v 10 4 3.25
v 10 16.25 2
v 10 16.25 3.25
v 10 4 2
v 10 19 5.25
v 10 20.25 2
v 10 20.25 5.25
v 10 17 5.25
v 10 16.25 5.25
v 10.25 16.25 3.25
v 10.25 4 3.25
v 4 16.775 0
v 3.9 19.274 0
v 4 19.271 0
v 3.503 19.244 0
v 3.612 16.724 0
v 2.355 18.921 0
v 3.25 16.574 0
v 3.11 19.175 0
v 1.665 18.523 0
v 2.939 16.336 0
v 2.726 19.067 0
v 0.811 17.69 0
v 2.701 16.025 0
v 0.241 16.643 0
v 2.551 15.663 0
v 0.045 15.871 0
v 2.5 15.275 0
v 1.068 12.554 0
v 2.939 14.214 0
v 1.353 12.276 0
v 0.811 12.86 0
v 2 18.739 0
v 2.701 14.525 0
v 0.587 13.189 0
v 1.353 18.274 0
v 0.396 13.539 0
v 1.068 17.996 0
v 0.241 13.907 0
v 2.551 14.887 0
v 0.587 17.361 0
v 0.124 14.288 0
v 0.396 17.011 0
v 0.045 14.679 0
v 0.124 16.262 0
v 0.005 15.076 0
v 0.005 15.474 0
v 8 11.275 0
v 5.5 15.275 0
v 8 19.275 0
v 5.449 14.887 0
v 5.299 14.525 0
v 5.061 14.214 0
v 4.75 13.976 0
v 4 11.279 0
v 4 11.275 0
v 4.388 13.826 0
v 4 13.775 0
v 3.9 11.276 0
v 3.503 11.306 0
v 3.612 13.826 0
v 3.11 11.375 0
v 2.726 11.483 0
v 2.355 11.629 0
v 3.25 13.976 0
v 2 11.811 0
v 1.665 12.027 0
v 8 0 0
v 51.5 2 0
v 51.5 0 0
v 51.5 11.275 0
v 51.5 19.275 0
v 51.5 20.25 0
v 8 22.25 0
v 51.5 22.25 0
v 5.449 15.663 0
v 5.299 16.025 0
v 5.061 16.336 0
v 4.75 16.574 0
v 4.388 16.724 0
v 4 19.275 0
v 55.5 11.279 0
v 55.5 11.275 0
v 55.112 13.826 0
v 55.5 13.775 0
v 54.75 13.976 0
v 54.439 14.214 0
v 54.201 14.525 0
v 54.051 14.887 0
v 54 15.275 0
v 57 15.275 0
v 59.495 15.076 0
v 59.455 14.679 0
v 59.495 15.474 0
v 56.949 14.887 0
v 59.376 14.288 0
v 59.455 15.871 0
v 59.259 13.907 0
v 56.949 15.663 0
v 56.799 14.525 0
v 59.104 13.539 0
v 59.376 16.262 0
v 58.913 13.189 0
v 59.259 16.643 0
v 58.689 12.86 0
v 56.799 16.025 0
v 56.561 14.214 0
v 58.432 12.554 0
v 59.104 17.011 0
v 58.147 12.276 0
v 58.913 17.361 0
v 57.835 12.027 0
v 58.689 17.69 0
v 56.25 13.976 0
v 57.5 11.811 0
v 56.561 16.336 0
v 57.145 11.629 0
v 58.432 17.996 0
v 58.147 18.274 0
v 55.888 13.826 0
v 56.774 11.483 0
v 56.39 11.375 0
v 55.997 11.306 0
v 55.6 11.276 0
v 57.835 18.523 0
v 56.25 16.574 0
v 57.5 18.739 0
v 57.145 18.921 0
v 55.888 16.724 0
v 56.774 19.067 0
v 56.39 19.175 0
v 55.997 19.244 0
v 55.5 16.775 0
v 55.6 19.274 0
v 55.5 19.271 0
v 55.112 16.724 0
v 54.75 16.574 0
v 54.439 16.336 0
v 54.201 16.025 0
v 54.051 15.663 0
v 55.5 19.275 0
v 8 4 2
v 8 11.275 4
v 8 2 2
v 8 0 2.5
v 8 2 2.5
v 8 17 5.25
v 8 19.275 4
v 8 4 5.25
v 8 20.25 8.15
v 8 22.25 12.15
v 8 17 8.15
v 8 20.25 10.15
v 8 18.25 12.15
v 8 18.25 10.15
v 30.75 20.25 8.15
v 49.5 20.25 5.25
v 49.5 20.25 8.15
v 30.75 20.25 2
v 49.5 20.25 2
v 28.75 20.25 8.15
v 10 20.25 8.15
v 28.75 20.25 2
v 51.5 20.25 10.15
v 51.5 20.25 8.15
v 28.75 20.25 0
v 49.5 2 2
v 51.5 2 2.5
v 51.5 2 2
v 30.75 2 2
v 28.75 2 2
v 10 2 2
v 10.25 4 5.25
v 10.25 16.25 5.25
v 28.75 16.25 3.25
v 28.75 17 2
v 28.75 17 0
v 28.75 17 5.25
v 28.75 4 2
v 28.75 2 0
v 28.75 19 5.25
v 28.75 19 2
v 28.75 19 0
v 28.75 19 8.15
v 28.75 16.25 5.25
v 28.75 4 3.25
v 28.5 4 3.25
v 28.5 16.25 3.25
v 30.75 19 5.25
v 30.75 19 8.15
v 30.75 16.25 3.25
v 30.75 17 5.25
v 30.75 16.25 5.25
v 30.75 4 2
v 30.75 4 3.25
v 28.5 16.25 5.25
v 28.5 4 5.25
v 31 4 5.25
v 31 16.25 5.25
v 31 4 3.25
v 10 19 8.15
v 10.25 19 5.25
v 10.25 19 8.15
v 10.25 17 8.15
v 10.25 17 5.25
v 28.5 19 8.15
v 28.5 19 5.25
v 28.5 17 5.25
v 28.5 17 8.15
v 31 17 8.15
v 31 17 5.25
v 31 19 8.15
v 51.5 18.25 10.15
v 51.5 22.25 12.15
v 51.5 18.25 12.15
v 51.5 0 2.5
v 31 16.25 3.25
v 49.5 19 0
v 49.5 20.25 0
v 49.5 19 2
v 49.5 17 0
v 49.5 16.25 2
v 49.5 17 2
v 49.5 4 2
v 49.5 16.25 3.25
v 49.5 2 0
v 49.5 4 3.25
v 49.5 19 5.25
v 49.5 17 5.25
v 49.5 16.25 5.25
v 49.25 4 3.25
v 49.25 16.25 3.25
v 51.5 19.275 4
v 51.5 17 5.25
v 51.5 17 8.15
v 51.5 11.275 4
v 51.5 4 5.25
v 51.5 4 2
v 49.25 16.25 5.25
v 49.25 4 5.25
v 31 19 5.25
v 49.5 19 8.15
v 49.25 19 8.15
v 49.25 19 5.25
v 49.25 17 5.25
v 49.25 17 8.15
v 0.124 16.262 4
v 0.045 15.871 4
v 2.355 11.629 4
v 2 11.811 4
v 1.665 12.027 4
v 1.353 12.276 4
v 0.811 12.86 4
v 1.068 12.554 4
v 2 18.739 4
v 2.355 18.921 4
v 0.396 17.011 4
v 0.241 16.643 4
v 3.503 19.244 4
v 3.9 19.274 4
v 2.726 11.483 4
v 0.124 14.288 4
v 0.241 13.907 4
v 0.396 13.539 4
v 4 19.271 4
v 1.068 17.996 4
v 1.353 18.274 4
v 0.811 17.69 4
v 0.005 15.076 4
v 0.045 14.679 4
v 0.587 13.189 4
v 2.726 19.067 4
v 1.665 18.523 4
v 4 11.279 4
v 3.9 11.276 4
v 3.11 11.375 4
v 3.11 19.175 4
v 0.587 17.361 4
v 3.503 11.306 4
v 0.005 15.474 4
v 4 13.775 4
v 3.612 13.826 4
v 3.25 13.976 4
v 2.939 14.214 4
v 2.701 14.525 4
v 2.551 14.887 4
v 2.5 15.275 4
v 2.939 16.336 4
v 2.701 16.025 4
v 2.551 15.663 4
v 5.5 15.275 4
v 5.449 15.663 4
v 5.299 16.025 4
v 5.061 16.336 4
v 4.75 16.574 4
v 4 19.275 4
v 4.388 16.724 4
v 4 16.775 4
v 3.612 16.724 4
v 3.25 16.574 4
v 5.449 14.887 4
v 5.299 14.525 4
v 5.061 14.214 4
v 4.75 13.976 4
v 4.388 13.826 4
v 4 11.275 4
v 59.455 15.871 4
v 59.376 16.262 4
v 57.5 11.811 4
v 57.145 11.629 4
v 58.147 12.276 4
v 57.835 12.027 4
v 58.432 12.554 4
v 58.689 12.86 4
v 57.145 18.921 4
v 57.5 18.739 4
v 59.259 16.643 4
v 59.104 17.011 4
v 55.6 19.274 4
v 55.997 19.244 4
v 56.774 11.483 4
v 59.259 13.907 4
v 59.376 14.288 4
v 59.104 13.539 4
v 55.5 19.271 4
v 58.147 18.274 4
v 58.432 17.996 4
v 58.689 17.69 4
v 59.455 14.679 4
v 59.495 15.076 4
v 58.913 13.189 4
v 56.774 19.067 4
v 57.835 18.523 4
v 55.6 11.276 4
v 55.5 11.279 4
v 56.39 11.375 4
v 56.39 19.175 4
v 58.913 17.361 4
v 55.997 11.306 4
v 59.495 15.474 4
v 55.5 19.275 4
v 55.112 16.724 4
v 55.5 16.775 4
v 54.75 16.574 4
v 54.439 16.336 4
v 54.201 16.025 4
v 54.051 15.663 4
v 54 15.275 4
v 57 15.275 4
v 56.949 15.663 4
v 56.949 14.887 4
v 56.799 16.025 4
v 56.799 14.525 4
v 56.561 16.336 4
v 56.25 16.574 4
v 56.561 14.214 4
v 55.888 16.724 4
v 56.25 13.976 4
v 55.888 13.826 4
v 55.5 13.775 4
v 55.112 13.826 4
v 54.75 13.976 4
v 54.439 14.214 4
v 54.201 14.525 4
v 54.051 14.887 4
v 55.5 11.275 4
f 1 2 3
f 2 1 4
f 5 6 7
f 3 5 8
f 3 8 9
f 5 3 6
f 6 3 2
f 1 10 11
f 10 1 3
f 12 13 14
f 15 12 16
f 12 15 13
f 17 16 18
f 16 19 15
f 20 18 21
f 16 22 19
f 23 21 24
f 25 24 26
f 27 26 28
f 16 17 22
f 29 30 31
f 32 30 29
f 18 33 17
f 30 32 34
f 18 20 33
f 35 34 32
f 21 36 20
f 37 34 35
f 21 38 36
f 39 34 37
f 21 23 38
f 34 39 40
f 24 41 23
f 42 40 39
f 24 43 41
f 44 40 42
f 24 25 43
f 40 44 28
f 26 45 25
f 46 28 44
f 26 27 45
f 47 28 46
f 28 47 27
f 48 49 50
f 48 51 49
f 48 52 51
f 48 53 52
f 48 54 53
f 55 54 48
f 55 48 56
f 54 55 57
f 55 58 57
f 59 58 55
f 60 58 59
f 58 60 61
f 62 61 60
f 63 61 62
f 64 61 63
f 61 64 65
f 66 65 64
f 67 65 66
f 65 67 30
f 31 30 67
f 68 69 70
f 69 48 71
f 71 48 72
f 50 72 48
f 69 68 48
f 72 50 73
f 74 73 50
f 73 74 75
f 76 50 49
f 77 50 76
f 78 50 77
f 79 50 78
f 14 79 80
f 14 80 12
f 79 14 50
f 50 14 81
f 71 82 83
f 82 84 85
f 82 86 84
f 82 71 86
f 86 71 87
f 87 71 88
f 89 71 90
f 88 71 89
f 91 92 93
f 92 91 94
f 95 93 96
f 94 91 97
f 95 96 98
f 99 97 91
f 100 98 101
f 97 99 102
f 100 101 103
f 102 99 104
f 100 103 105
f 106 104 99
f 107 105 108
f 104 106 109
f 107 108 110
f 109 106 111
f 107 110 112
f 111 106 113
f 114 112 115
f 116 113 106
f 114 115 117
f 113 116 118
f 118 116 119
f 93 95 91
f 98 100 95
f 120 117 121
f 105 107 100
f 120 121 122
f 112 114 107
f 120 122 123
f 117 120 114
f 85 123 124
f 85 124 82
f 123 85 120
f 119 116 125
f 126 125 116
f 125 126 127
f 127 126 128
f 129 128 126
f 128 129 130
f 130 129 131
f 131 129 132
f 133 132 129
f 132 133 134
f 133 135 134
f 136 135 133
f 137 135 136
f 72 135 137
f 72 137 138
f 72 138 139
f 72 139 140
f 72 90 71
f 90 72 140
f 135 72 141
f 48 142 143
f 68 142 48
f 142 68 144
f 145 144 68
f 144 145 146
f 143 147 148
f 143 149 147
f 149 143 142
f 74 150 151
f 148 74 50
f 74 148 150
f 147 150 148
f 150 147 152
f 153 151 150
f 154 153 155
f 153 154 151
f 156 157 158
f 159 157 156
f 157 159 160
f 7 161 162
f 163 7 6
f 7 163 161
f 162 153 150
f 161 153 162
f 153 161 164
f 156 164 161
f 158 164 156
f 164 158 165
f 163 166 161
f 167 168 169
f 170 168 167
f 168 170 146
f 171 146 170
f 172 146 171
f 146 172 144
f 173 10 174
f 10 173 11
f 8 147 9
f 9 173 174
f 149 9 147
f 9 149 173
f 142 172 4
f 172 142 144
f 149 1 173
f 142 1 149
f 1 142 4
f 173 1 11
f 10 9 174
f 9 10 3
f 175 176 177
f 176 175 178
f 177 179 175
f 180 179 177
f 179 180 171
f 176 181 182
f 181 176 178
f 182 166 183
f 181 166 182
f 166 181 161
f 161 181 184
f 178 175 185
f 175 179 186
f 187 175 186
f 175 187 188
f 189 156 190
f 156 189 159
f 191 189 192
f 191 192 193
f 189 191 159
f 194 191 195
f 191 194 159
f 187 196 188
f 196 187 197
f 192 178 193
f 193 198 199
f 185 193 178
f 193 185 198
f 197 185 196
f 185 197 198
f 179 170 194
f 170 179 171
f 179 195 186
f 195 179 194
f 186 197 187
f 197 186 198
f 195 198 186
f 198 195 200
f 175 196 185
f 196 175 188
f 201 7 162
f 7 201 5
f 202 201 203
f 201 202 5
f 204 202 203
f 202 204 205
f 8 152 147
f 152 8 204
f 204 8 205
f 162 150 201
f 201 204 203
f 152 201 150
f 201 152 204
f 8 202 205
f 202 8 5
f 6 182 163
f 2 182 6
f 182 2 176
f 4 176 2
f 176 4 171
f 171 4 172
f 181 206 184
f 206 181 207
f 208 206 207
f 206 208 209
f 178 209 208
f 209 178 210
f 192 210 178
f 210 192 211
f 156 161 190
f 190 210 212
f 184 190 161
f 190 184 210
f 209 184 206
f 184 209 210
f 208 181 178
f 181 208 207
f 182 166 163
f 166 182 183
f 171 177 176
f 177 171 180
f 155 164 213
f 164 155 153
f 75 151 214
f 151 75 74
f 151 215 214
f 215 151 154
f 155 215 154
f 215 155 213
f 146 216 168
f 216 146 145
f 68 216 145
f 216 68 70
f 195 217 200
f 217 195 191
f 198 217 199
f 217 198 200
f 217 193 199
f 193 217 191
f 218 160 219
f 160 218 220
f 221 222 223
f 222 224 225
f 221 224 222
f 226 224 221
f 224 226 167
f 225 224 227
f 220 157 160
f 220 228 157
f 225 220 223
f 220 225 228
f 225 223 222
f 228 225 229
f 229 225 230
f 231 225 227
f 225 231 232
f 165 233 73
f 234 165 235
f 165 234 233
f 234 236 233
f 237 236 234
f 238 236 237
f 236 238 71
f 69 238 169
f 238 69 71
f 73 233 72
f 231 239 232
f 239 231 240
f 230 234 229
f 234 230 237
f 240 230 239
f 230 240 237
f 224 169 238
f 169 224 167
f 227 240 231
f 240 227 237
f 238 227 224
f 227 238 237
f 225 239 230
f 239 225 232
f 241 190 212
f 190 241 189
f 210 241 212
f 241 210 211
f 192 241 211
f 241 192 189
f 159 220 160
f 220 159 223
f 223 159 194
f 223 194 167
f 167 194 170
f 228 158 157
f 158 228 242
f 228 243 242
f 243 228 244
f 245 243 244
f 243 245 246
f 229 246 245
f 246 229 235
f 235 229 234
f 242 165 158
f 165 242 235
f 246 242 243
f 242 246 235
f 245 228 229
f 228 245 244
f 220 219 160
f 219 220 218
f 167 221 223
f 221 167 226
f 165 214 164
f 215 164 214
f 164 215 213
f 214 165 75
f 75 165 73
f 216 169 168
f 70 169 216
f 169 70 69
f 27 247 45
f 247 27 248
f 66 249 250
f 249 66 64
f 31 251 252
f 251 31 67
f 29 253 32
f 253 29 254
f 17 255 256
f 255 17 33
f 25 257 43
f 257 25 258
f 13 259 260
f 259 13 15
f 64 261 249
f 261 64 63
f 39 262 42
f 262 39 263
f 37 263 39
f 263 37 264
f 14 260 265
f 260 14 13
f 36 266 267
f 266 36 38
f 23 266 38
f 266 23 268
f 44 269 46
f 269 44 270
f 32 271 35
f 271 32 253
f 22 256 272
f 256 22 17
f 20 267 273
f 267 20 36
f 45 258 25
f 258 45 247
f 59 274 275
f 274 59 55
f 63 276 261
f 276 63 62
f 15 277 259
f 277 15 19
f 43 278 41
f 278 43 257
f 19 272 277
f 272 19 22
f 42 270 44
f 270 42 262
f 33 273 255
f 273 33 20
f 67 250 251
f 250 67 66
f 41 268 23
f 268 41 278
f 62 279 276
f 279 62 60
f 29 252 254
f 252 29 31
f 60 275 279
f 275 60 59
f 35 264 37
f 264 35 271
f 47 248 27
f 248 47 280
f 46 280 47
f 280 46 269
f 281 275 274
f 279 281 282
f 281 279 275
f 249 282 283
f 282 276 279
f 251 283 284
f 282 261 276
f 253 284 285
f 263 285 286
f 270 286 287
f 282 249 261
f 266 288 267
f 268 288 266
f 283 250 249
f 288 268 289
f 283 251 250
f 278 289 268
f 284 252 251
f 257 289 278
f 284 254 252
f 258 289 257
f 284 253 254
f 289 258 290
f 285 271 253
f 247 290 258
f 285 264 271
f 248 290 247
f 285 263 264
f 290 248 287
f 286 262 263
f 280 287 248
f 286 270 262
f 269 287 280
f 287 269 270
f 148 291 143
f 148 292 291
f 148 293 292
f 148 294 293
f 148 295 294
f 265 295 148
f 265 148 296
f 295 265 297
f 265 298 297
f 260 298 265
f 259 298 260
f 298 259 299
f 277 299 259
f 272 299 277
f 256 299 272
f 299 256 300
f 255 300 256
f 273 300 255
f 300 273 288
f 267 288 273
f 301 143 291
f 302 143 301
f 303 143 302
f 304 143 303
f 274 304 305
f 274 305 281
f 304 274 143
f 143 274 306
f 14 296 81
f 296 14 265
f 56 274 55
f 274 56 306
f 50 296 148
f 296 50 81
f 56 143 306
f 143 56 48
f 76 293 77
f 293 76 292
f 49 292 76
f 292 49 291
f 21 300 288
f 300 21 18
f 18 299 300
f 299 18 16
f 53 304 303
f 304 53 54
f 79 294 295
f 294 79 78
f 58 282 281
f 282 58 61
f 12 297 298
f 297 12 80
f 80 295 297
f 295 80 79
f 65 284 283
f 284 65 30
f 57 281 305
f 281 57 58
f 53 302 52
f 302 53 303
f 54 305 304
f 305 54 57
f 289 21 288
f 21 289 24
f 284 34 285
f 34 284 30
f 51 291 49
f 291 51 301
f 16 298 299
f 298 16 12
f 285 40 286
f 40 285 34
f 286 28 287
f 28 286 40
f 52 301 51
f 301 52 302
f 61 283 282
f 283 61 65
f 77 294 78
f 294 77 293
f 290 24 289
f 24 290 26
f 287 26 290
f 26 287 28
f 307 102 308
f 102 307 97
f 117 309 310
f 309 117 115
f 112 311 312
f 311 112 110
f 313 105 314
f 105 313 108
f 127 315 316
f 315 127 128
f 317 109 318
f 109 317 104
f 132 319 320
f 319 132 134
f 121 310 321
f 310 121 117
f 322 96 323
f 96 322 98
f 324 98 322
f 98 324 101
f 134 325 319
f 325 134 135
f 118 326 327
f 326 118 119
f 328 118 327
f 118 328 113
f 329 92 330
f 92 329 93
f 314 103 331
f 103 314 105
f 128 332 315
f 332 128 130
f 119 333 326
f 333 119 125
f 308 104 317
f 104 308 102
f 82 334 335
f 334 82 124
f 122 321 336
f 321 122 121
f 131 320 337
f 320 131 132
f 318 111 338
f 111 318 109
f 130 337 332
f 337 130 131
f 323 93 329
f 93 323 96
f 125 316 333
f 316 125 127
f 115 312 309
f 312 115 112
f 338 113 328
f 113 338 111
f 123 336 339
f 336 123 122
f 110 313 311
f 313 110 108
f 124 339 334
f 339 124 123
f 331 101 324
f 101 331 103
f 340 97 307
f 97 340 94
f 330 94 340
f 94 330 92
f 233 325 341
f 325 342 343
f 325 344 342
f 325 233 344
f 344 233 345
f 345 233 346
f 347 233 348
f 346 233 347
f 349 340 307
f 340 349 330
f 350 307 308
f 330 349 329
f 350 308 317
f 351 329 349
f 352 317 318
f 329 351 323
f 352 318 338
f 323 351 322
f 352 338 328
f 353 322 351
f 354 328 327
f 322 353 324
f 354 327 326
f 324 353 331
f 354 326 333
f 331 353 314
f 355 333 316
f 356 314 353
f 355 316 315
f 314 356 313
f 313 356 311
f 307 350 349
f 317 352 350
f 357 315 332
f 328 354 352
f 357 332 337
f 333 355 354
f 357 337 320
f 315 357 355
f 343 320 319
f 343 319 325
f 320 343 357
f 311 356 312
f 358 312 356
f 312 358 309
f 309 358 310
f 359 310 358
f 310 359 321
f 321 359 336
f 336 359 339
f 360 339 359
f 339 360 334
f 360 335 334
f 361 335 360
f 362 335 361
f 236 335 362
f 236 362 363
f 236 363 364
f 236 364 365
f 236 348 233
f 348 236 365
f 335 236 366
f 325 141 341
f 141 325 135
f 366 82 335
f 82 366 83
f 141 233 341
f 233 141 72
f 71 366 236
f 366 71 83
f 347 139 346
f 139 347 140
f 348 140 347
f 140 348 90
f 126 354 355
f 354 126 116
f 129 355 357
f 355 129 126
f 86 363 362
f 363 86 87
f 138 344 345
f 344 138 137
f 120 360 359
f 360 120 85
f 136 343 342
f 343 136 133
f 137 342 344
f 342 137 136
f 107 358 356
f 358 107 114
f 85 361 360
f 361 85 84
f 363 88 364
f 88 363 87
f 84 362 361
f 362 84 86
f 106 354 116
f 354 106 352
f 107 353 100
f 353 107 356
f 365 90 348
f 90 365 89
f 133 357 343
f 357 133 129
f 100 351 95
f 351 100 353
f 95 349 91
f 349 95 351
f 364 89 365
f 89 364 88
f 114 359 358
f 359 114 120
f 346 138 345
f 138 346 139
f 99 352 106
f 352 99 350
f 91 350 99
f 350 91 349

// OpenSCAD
// ////////////////////////////////////////////////
//
// WAGO 221 mount
//
// Creates a single row or double row set of 221 blocks
// with mounting tabs/ears at either end.
//
// Created - 2017/01/01 by Joo Chung
//
// ////////////////////////////////////////////////

// ////////////////////////////////////////////////
// vector of blocks. each element specifies the number of conductors for that block
// EDIT THIS
// blocks = [5, 3, 2]; // a set of 5 conductor, 3 conductor, 2 conductor blocks
// blocks = [5, 5, 5]; // a set of three 5 conductor blocks
// blocks = [2]; // a single 2 conductor block
// blocks = [3]; // a single 3 conductor block
blocks=[3, 3];


// ////////////////////////////////////////////////
// Mirror the mount, stand it up, and put tabs on bottom.
// 0 - no mirror, 1 - mirror, rotate so its standing up, and reposition tabs
// 2 - mirror, rotate so that they are laying flat, and reposition tabs.
// EDIT THIS
mirror = 0;

// ////////////////////////////////////////////////
// Tabs - include or exclude mounting tabs
// EDIT THIS: 0 - no tabs, 1 - tabs
tabs = 1;
// EDIT THIS: radius of hole in tab
tabradius = 1.5;
// EDIT THIS: thickness of tab
tabheight = 4;
// EDIT THIS: Set width and length of the tab. (tab is basically a square)
tabwidth = 8;



// ////////////////////////////////////////////////
// Block dimensions in mm -- DO NOT EDIT
conwidth = 5.6; // width of a single conductor
// DO NOT EDIT
border = 1.75; // block transparent plastic border
// DO NOT EDIT
blockdepth = 18.25;
// DO NOT EDIT
fudge = 0.2;

// ////////////////////////////////////////////////
// OpenSCAD special variables -- DO NOT EDIT
$fa = 1;
// DO NOT EDIT
$fs = 0.4;

// ////////////////////////////////////////////////
// Functions
function bw(x) = conwidth*x+border+fudge; // block width
function mw(i, n) = ( i==0 ? bw(blocks[i]) + 2 + mw(i+1, n) : (i < n ? bw(blocks[i]) + 2 + mw(i+1, n) : 0)); // mount width (index, max index)


// ////////////////////////////////////////////////
// Modules
module tab(width, hole, thickness) {
    difference() {
        union () {
            cylinder(thickness,width/2,width/2, true);
            translate([width/4,0,0]) cube([width/2,width,thickness], true);
        }
    cylinder(width,hole,hole, true);
    }
}

module shoulder (depth) {
    difference () {
        union () {
            cube([2, blockdepth, 3.25], false);
            translate([0,0,3.25]) cube([2.25, blockdepth, 2], false);
        }
        translate([0,0,2]) cube([2.25,2,3.25], false);
        translate([2,blockdepth-4,2]) cube([0.25,4,3.25], false);
    }
}


module backshoulder (height) {
    difference() {
        union() {  
            translate([0, 2, 0]) cube ([2, 1.25, 10.15]);
            cube ([2.25, 2, 10.15]);
        }
        translate([0,0,10.15-2]) cube([2.25,3.25,2]);
        translate([2,0,2]) cube([1.25,3.25,3.25]);
    }
}



// WAGO 221 block
module block (nconn) {
    blockwidth = bw(nconn);

    // base
    translate([2,2,0]) cube([blockwidth, blockdepth, 2], false);
    
    // back headboard
    translate([0,blockdepth+2,0]) cube([blockwidth+4, 2, 10.15], false);

    // back lip
    translate([0,blockdepth,10.15]) cube([blockwidth+4, 4, 2], false);
    
    // front lip
    translate([0,0,0]) cube([blockwidth+4, 2, 2.5], false);

    // left shoulder and right shoulders
    translate([0,2,0]) shoulder();
    translate([blockwidth+4,2,0]) mirror() shoulder(); 
    
    // back left and shoulder
    translate([0, blockdepth-1.25, 0]) backshoulder(); 
    translate([blockwidth+4, blockdepth -1.25, 0]) mirror() backshoulder();
    
}



// ////////////////////////////////////////////////
// MAIN BODY

mountwidth=mw(0, len(blocks));
if (mirror==0) { // No mirror. Single row of blocks
    // create array of blocks
    for (i=[0:len(blocks)-1]) {
        offset = (i==0) ? tabwidth : tabwidth + mw(0, i);
        translate([offset, 0, 0]) block(blocks[i]);
    }
        
    // left and right tabs
    if (tabs==1) {
        translate([tabwidth/2,(blockdepth+12.3)/2,tabheight/2]) tab (tabwidth, tabradius, tabheight);
        translate([mountwidth+2+tabwidth+tabwidth/2,(blockdepth+12.3)/2,tabheight/2]) mirror() tab (tabwidth, tabradius, tabheight);
    }
} else if (mirror==1) { // Mirrored. two rows of blocks, back to back.
    // Row #1. Stand up on headboard.
    rotate([-90,0,0]) for (i=[0:len(blocks)-1]) {
        offset = (i==0) ? tabwidth : tabwidth + mw(0, i);
        translate([offset, 0, -1]) block(blocks[i]);
    }
    
    // Row #2. Opposite rotation. Stand up on headbord
    rotate([90,0,0]) mirror ([0, 1, 0]) for (i=[0:len(blocks)-1]) {
        offset = (i==0) ? tabwidth : tabwidth + mw(0, i);
        translate([offset, 0, -1]) block(blocks[i]);
    }   
    
    // left and right tabs
    if (tabs==1) {
        translate([tabwidth/2,0,-blockdepth-tabheight/2]) tab (tabwidth, tabradius, tabheight);
        translate([mountwidth+2+tabwidth+tabwidth/2,0,-blockdepth-tabheight/2]) mirror() tab (tabwidth, tabradius, tabheight);
    }
} else if (mirror==2) {
    // Row #1. 
    for (i=[0:len(blocks)-1]) {
        offset = (i==0) ? tabwidth : tabwidth + mw(0, i);
        translate([offset, -blockdepth-6, -1]) block(blocks[i]);
    }
    
    // Row #2. Flip
    mirror ([0, 1, 0]) for (i=[0:len(blocks)-1]) {
        offset = (i==0) ? tabwidth : tabwidth + mw(0, i);
        translate([offset, -blockdepth, -1]) block(blocks[i]);
    }   
    
    // left and right tabs
    if (tabs==1) {
        translate([tabwidth/2,-3,(tabheight-2)/2]) tab (tabwidth, tabradius, tabheight);
        translate([mountwidth+2+tabwidth+tabwidth/2,-3,(tabheight-2)/2]) mirror() tab (tabwidth, tabradius, tabheight);
    }
}

//extra stick length used for wagos on back of trident
//translate([10,-15,0])
//cube([32.3, blockdepth*3, 2.5]);
